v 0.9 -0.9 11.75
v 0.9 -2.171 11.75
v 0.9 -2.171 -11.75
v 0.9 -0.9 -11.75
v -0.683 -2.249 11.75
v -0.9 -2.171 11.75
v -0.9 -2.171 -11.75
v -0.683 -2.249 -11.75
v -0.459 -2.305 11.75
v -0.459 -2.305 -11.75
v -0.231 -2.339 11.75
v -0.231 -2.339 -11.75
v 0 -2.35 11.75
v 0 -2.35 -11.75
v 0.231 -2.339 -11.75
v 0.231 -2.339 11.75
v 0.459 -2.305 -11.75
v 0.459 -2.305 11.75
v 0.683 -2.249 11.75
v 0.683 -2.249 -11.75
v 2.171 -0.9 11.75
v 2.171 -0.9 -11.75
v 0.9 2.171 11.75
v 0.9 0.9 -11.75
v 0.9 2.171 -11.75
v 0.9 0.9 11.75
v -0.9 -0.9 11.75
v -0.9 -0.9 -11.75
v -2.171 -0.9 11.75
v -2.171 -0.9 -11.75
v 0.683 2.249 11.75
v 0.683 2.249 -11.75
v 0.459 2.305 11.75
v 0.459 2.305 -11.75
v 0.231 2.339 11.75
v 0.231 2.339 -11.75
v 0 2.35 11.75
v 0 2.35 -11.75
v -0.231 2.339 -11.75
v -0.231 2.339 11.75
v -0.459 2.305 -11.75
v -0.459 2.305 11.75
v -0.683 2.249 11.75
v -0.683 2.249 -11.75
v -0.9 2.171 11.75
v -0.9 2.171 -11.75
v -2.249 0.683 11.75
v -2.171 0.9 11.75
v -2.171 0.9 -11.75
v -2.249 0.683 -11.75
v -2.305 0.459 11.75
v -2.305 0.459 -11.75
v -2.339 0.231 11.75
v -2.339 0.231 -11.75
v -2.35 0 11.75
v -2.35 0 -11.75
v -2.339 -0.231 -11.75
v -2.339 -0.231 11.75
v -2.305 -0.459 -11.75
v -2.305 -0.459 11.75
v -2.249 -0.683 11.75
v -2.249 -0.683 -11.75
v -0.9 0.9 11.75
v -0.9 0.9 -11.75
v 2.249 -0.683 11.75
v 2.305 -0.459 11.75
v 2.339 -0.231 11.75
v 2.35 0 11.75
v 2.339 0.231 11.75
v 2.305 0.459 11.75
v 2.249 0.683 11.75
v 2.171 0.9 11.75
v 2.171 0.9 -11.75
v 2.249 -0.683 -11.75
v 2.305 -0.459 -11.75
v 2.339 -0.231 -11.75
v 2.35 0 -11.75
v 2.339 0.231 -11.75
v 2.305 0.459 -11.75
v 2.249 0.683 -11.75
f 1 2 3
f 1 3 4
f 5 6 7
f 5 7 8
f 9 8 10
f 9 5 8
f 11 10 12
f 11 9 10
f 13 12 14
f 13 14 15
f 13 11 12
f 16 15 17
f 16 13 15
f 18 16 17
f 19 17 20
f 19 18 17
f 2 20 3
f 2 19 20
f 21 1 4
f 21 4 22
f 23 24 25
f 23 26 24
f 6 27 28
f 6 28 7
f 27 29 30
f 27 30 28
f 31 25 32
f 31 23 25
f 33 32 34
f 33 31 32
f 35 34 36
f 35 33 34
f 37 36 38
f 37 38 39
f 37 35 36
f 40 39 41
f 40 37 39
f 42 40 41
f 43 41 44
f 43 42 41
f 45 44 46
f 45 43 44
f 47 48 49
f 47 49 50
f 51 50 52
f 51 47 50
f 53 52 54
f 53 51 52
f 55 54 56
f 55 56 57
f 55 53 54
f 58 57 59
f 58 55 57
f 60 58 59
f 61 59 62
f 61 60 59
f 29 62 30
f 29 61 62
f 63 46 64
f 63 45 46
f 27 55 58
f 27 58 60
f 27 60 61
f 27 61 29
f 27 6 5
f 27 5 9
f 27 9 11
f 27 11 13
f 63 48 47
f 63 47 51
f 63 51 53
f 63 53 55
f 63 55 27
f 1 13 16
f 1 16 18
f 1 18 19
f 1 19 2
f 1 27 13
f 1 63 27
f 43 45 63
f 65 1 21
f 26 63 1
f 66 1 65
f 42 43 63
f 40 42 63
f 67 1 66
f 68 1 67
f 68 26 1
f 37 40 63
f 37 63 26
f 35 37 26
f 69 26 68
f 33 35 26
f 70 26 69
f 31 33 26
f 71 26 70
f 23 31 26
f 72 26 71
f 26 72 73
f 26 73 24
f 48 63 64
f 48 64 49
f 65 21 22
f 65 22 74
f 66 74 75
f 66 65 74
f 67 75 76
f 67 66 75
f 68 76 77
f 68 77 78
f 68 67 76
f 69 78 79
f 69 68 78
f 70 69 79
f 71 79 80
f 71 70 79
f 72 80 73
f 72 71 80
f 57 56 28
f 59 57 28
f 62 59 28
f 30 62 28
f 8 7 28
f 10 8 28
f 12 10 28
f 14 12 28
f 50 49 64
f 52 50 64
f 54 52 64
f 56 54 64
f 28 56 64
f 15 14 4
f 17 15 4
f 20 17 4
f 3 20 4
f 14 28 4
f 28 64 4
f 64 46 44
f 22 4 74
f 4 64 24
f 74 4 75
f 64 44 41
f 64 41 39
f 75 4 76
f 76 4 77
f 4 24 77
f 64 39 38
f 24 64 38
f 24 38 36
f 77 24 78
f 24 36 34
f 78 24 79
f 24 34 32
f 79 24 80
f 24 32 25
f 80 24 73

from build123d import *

# Parameters (mm, degrees)
BOSS_EXTRUDE1_DEPTH = 11.75


with BuildPart() as part:
    # Sketch1 → Boss-Extrude1 (new, symmetric)
    with BuildSketch(Plane.XY):
        with BuildLine():
            Line((-0.9, 2.170829335), (-0.9, 0.9))
            Line((-0.9, 0.9), (-2.170829335, 0.9))
            ThreePointArc((-2.170829335, 0.9), (-2.35, 0), (-2.170829335, -0.9))
            Line((-2.170829335, -0.9), (-0.9, -0.9))
            Line((-0.9, -0.9), (-0.9, -2.170829335))
            ThreePointArc((-0.9, -2.170829335), (0, -2.35), (0.9, -2.170829335))
            Line((0.9, -2.170829335), (0.9, -0.9))
            Line((0.9, -0.9), (2.170829335, -0.9))
            ThreePointArc((2.170829335, -0.9), (2.35, 0), (2.170829335, 0.9))
            Line((2.170829335, 0.9), (0.9, 0.9))
            Line((0.9, 0.9), (0.9, 2.170829335))
            ThreePointArc((0.9, 2.170829335), (0, 2.35), (-0.9, 2.170829335))
        make_face()
    extrude(amount=BOSS_EXTRUDE1_DEPTH, both=True)


solid = part.part
